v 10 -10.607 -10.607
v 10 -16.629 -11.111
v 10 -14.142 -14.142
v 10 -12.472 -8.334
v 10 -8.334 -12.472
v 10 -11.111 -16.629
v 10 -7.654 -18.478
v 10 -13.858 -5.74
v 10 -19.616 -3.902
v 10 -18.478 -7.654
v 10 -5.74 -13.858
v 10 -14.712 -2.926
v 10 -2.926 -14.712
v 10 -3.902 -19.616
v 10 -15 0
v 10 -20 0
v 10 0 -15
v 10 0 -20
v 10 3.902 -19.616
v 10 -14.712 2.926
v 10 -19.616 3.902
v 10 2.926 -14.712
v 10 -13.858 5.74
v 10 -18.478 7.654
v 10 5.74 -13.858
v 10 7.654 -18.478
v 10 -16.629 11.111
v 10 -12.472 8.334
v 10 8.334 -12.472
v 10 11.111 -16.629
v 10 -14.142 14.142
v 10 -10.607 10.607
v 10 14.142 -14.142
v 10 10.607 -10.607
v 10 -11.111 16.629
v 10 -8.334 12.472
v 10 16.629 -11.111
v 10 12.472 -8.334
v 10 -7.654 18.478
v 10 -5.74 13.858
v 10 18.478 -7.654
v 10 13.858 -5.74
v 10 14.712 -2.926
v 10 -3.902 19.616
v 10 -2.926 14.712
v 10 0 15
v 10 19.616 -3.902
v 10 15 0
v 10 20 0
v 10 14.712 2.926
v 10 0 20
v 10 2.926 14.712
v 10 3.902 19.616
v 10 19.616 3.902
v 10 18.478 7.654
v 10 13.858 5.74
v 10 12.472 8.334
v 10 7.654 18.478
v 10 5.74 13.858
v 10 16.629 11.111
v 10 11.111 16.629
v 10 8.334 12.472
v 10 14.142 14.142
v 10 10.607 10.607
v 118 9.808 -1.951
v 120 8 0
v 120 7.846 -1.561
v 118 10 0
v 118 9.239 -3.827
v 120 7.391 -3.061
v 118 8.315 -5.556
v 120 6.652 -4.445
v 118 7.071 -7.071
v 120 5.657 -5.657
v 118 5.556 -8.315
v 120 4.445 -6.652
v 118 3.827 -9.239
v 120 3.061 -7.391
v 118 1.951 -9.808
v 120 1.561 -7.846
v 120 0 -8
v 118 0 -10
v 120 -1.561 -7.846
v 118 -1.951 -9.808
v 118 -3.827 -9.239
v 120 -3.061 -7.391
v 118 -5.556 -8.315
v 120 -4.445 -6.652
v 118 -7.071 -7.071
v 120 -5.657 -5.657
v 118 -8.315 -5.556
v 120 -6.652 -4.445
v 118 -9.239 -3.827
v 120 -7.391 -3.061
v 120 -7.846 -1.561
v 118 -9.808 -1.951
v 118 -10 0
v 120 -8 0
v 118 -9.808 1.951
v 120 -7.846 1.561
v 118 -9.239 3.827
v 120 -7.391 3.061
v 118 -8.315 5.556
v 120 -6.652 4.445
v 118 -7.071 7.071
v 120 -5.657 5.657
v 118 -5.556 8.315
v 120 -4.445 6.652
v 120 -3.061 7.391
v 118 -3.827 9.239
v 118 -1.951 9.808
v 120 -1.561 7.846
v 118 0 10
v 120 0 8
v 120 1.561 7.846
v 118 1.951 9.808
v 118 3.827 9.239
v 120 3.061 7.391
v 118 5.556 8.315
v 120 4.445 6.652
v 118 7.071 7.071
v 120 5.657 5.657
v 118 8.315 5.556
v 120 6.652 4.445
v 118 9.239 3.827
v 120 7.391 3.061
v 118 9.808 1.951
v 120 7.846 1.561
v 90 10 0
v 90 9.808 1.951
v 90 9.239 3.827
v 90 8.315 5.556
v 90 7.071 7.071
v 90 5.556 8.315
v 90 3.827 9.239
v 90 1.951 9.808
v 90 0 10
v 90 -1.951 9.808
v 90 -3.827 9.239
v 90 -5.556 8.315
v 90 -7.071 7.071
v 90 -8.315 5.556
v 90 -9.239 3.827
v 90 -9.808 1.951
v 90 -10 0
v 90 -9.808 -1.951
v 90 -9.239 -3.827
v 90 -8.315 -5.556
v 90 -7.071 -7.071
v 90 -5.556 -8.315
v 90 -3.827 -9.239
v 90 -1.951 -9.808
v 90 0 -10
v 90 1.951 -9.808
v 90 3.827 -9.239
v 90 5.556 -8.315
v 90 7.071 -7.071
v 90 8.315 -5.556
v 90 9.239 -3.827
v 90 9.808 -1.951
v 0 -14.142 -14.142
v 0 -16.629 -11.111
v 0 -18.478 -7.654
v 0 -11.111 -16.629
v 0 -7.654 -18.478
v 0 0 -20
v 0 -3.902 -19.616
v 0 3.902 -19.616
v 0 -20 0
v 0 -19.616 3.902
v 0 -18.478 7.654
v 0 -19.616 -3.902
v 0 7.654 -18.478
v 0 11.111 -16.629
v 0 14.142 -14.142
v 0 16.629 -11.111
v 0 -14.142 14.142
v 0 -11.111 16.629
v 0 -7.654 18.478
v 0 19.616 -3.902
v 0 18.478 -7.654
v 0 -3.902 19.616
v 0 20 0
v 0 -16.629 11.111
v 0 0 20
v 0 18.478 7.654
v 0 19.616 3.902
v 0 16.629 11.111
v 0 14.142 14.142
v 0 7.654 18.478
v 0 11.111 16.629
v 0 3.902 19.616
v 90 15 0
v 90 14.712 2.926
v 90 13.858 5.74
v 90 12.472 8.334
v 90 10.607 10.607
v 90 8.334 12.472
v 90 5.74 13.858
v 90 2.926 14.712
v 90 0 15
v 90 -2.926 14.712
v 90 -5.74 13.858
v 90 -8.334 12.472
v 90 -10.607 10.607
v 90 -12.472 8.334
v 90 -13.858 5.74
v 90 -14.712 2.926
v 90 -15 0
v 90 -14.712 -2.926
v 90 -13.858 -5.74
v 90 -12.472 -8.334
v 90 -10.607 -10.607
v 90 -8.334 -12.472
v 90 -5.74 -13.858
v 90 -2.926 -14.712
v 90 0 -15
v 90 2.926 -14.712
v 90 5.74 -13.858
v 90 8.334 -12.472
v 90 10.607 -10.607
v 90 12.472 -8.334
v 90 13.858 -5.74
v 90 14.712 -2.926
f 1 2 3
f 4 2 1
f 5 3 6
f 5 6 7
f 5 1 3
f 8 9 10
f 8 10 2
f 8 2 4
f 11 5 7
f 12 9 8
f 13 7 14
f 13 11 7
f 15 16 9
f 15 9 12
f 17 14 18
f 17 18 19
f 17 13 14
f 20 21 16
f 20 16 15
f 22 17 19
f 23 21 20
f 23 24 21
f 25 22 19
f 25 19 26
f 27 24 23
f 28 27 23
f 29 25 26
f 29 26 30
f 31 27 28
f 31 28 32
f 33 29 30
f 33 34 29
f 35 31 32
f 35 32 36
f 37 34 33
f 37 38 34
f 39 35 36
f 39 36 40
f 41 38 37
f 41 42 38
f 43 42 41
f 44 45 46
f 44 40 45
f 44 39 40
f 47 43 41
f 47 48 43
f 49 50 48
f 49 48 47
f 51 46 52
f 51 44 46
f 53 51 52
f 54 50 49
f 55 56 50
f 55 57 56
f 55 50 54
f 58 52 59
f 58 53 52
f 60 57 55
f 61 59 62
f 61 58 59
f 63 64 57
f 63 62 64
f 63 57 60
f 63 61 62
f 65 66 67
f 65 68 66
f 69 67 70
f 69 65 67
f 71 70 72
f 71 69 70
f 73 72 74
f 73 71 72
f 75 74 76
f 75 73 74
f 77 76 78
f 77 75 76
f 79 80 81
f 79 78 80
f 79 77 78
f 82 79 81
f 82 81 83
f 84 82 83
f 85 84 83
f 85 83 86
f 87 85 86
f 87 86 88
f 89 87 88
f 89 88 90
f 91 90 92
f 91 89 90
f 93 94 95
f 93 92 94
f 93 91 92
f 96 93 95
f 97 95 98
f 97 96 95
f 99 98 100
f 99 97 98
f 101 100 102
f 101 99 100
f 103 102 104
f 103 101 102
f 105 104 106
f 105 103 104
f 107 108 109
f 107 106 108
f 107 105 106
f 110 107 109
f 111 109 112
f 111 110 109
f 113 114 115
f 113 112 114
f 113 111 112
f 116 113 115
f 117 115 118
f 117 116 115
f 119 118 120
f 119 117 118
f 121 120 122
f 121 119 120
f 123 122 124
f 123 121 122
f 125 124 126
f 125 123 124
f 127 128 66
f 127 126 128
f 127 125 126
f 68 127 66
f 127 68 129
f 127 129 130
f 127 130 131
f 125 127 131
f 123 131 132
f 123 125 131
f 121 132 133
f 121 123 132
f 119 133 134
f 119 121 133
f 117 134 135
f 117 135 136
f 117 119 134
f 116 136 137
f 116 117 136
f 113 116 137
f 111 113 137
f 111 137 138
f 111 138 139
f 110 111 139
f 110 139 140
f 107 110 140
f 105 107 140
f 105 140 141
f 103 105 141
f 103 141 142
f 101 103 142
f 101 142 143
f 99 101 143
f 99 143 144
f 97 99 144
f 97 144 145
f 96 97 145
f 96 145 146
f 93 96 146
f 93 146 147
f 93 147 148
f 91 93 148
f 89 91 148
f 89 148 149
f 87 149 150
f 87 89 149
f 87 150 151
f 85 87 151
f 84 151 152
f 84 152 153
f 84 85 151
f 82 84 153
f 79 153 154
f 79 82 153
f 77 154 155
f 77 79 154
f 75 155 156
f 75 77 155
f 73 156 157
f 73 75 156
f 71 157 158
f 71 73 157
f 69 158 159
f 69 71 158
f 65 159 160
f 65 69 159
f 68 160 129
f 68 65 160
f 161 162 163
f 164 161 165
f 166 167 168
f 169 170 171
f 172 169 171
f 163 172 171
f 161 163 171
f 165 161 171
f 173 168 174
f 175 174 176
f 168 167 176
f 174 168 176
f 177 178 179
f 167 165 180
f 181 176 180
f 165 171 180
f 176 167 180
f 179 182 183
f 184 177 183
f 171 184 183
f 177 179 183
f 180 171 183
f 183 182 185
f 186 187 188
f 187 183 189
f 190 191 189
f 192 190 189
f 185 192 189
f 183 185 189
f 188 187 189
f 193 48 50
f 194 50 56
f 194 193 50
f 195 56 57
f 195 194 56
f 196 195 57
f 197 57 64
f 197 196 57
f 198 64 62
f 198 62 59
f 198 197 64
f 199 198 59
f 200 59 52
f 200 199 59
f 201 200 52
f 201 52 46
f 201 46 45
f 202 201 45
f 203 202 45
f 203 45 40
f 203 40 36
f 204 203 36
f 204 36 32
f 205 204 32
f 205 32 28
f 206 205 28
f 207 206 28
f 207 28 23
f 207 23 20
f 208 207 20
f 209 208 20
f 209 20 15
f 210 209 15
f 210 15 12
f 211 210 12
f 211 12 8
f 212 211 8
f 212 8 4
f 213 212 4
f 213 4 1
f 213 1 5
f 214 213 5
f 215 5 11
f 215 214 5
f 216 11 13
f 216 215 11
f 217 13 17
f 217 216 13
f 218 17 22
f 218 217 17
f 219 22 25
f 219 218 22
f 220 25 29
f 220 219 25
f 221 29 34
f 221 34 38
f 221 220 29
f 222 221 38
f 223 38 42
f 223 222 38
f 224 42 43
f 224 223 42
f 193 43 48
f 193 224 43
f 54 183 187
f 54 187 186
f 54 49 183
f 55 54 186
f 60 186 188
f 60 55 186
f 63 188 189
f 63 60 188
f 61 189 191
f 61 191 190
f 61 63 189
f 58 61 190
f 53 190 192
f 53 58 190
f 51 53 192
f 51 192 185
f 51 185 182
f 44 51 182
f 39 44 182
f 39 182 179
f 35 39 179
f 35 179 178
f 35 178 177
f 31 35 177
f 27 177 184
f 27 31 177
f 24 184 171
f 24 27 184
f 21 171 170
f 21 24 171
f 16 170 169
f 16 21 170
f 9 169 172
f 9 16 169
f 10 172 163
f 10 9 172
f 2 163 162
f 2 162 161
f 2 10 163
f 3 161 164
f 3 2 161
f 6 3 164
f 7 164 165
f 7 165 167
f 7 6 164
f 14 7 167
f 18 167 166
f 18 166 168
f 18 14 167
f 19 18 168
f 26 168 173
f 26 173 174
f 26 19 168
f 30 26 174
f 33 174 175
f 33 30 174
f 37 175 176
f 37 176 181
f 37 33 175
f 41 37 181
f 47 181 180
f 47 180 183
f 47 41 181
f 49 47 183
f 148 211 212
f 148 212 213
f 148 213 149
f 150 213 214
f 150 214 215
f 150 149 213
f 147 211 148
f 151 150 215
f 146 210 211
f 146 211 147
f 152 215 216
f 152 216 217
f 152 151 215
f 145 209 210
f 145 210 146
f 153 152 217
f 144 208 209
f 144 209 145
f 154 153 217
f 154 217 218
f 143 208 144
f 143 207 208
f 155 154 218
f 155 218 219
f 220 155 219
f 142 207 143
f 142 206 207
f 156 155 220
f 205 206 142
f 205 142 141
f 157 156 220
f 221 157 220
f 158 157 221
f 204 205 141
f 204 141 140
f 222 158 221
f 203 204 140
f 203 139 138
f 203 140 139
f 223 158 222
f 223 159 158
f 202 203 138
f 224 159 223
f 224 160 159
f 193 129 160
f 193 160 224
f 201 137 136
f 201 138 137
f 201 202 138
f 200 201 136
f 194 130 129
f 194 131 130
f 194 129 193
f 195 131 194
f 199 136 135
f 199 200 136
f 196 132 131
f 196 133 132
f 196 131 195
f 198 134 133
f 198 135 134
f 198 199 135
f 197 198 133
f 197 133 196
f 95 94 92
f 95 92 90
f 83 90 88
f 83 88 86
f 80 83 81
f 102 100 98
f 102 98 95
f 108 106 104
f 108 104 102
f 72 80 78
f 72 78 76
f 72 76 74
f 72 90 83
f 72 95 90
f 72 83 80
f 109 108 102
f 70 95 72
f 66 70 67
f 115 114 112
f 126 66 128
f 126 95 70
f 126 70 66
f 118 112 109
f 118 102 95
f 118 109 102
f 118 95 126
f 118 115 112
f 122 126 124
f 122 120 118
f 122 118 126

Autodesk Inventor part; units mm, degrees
ref_plane "Начальная плоскость" through (0, 0, 0) normal (1, 0, 0) x (0, 1, 0)
ref_plane "XZ Plane" through (0, 0, 0) normal (0, 1, 0) x (-1, 0, 0)
ref_plane "XY Plane" through (0, 0, 0) normal (0, 0, 1) x (1, 0, 0)
sketch "Основной эскиз" plane through (0, 0, 0) normal (0, 0, 1) x (1, 0, 0)
  line L0 (0, 0) -> (120, 0)
  line L1 (10, 20) -> (10, 15)
  line L2 (0, 20) -> (10, 20)
  line L3 (90, 15) -> (90, 10)
  line L4 (10, 15) -> (90, 15)
  line L5 (120, 10) -> (120, 0)
  line L6 (90, 10) -> (120, 10)
  line L7 (0, 0) -> (0, 20)
  dimension "d4" = 40
  dimension "d5" = 30
  dimension "d6" = 20
revolve "Вращение1" add sketch "Основной эскиз" angle 360 about axis through (0, 0, 0) along (1, 0, 0)
chamfer "Фаска1" distance 2 angle 45 1 edges at (120, -10, 0) measured on face at (110, 9.9676, -0.8047)
properties part number "Вал" material "Steel"
